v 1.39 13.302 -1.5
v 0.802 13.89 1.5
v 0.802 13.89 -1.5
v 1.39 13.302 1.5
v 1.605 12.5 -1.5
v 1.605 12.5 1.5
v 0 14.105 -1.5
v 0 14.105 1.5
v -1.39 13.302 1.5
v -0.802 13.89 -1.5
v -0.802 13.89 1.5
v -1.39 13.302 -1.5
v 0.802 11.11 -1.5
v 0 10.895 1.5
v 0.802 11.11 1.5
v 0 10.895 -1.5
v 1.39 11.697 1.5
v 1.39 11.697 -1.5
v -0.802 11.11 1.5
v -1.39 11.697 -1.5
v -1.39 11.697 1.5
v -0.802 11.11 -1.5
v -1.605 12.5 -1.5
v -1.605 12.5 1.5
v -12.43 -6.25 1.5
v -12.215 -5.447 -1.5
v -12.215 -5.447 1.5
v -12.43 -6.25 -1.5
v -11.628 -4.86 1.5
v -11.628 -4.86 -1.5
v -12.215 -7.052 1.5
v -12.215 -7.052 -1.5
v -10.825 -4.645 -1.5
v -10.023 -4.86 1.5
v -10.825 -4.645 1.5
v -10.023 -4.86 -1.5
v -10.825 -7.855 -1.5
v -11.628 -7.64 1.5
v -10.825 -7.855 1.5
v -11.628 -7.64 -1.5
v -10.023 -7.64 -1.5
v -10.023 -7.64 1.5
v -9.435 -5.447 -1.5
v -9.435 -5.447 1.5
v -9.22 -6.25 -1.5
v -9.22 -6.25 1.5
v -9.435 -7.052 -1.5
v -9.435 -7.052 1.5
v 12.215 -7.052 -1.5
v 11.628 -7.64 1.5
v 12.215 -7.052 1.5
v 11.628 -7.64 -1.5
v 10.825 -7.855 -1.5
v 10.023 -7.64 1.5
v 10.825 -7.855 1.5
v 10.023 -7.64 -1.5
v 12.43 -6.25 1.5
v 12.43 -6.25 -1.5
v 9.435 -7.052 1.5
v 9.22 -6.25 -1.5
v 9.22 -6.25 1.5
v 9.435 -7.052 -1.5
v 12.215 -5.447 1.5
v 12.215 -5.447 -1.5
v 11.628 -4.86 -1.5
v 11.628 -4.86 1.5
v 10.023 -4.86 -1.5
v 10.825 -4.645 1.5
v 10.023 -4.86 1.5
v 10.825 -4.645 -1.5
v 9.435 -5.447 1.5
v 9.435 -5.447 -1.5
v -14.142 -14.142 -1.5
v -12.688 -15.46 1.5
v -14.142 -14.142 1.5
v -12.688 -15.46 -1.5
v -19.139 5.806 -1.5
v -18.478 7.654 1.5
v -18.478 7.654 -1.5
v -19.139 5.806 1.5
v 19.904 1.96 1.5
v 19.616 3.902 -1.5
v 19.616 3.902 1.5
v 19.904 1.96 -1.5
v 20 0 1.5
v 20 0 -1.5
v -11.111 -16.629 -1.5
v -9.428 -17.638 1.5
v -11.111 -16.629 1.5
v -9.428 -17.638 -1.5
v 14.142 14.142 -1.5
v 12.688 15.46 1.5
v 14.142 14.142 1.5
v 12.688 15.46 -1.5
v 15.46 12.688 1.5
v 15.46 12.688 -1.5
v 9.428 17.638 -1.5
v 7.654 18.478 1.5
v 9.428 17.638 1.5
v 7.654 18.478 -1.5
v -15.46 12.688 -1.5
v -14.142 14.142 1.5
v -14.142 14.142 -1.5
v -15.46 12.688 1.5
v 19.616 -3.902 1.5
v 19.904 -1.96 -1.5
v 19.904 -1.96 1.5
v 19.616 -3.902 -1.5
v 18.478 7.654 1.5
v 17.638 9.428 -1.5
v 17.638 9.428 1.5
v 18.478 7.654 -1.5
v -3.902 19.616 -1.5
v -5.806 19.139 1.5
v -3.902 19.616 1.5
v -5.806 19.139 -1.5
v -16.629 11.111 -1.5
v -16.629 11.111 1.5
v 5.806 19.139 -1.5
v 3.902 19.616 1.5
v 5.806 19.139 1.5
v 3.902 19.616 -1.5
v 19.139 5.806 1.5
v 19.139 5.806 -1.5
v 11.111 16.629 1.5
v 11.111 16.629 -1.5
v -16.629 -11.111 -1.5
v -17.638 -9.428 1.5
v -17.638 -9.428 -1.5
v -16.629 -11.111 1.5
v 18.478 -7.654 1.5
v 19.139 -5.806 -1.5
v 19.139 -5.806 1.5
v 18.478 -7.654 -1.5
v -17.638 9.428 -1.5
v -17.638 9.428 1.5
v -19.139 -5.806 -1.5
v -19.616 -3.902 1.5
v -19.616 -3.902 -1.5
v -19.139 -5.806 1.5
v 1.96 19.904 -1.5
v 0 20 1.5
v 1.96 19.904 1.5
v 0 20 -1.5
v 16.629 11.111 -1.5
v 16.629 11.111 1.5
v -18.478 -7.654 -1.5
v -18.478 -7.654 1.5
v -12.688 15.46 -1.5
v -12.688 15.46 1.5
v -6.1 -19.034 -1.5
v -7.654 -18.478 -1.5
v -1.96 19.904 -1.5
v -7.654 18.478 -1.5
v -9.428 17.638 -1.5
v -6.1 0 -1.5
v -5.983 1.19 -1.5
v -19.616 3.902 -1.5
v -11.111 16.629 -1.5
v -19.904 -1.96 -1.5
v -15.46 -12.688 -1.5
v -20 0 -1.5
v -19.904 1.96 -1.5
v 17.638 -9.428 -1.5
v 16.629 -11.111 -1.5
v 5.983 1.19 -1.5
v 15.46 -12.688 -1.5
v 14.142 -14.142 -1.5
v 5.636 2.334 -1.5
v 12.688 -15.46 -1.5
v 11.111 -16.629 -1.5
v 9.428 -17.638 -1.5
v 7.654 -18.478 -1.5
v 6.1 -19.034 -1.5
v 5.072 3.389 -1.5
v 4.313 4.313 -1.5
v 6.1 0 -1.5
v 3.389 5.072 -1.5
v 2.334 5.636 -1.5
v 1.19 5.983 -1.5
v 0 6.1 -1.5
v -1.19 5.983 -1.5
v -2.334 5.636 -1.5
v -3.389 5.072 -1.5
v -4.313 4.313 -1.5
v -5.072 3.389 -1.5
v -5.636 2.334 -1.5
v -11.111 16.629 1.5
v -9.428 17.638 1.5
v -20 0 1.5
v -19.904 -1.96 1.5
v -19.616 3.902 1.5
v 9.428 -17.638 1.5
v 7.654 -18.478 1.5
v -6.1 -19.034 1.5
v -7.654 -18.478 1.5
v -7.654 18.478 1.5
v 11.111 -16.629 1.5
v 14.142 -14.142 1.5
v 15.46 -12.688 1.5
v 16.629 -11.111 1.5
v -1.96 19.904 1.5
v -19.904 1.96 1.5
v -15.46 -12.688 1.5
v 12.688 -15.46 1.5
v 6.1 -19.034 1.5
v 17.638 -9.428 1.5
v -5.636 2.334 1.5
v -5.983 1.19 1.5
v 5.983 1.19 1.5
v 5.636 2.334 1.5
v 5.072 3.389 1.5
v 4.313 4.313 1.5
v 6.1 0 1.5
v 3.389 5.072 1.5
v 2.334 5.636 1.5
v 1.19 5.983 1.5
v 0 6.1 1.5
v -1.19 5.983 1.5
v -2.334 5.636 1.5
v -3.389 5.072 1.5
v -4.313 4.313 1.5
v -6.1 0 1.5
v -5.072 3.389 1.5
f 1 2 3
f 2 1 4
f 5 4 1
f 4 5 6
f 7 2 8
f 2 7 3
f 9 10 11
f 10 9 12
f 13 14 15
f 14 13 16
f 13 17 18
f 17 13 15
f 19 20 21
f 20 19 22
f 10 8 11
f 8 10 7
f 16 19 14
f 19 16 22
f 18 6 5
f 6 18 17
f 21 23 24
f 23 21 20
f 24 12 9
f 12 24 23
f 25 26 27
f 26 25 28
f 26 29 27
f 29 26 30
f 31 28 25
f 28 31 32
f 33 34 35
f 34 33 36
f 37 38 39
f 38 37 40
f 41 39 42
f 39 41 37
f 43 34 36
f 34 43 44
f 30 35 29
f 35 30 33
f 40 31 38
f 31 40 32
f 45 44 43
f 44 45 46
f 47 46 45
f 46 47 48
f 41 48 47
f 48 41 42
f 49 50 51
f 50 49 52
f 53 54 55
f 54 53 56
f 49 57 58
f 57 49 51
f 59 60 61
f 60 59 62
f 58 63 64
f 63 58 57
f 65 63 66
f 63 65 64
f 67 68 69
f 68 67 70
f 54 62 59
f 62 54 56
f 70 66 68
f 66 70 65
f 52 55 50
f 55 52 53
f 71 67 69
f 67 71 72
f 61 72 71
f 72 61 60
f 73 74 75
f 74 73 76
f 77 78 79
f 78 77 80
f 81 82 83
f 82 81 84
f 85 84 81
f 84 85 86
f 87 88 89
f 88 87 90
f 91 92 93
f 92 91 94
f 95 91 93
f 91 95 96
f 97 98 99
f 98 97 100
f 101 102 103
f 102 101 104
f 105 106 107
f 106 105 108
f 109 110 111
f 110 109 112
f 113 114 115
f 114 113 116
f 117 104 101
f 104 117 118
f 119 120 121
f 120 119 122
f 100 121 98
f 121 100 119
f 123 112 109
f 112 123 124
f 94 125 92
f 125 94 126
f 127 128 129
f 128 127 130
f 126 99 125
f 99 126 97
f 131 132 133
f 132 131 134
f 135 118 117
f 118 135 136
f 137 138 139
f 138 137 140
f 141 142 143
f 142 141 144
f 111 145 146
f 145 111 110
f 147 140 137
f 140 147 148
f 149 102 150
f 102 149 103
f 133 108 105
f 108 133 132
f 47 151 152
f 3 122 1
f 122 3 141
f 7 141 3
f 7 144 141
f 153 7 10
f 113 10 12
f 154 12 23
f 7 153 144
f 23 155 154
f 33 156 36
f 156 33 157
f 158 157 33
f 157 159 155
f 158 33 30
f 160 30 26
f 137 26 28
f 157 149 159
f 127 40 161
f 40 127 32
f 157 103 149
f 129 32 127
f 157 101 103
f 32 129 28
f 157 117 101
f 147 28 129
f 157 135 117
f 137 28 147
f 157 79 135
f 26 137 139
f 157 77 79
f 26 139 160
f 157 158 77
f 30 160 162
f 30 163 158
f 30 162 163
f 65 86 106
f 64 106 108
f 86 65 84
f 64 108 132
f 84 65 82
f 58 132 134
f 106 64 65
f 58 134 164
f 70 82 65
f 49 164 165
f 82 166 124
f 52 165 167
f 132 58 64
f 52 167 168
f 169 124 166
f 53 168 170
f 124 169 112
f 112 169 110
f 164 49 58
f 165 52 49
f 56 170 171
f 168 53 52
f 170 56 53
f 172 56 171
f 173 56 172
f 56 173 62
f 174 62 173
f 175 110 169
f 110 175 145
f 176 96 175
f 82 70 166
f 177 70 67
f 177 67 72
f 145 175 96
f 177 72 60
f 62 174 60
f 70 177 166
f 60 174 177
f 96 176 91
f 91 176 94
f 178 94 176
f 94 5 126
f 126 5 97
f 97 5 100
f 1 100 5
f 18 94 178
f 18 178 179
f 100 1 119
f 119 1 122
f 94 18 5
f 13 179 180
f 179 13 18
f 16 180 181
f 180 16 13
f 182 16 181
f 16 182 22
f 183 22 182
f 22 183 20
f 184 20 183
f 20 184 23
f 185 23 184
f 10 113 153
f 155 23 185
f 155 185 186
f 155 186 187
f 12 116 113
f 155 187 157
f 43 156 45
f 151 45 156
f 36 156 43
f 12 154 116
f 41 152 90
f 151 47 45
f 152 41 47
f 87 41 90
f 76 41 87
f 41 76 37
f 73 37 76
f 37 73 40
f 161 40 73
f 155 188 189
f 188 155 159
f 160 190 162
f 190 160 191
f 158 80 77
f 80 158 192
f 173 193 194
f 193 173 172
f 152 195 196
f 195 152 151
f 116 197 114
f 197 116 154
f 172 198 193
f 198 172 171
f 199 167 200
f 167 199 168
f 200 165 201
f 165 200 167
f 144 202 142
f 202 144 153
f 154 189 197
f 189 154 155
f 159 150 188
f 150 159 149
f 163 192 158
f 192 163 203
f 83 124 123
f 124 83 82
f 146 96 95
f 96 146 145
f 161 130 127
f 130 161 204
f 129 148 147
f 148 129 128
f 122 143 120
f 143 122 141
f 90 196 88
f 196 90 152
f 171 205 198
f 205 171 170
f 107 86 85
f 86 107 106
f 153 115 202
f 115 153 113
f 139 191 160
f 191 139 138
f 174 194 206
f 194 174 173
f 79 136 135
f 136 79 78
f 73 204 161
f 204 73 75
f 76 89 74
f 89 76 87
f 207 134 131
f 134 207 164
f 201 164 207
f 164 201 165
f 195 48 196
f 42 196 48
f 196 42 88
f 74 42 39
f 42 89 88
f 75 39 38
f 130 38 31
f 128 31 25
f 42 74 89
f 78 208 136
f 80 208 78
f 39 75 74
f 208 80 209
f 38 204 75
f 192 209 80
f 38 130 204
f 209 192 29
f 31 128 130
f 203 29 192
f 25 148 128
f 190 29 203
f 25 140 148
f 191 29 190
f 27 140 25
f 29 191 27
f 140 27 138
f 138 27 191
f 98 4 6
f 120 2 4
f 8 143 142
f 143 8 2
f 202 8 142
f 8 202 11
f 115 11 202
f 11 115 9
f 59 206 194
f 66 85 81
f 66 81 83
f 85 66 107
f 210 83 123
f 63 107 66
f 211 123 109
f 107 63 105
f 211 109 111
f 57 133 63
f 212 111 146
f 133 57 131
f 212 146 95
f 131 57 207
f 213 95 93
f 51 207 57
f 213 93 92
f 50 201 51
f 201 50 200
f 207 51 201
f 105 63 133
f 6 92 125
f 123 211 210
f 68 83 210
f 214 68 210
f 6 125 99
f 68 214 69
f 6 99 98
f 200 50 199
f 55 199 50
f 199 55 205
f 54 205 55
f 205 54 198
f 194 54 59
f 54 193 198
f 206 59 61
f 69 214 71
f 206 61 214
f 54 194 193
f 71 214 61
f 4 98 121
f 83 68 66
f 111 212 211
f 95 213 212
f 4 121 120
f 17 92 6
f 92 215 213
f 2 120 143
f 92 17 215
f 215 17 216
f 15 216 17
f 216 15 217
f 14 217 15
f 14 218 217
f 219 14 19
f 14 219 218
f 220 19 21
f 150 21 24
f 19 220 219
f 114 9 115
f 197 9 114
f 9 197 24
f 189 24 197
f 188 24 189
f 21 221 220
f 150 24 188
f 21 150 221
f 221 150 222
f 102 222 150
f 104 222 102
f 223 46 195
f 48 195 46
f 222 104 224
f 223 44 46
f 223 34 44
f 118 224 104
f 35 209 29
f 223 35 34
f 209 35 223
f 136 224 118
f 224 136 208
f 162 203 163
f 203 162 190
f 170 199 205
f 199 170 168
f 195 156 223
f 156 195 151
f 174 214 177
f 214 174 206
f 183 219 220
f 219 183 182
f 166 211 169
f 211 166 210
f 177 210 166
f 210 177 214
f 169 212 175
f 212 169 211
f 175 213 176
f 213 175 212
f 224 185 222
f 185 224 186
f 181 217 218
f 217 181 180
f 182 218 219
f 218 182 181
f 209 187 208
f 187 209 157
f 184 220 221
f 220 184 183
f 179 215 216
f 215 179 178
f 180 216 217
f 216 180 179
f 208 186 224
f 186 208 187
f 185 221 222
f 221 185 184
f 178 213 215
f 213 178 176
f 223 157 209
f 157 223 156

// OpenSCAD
// file: configuration.scad
// Increase this if your slicer or printer make holes too tight.
extra_radius = 0.1;
extra_extrusion_width = 0.5;

// OD = outside diameter, corner to corner.
m3_nut_od = 6.1;
m3_nut_radius = m3_nut_od/2 + 0.35 + extra_radius;
m3_washer_radius = 3.5 + extra_radius;

// Major diameter of metric 3mm thread.
m3_major = 2.85;
m3_radius = m3_major/2 + extra_radius;
m3_wide_radius = m3_major/2 + extra_radius;

// NEMA17 stepper motors.
motor_shaft_diameter = 5;
motor_shaft_radius = motor_shaft_diameter/2 + extra_radius;

// Frame brackets. M3x8mm screws work best with 3.6 mm brackets.
thickness = 3.6;

// OpenBeam or Misumi. Currently only 15x15 mm, but there is a plan
// to make models more parametric and allow 20x20 mm in the future.
extrusion = 15;

// Placement for the NEMA17 stepper motors.
motor_offset = 44;
motor_length = 47;
// main file
include <configuration.scad>;

mount_radius = 12.5;  // Hotend mounting screws, standard would be 25mm.
height = 3;
hotend_r = 6.1;
m3_extra_clearance = 0.08;


difference(){
	cylinder(r = 20, h=height, $fn=64, center=true);
	rotate(-90) translate([0, -hotend_r, -height])
		cube([20, hotend_r*2, 2*height]);
	cylinder(r=hotend_r, h=2*height, $fn=32, center=true);
	for (a = [0:120:359]) rotate([0, 0, a]) {
			translate([0, mount_radius, 0])
				cylinder(r=m3_wide_radius + m3_extra_clearance, h=2*height, center=true, $fn=12);
	}
}
